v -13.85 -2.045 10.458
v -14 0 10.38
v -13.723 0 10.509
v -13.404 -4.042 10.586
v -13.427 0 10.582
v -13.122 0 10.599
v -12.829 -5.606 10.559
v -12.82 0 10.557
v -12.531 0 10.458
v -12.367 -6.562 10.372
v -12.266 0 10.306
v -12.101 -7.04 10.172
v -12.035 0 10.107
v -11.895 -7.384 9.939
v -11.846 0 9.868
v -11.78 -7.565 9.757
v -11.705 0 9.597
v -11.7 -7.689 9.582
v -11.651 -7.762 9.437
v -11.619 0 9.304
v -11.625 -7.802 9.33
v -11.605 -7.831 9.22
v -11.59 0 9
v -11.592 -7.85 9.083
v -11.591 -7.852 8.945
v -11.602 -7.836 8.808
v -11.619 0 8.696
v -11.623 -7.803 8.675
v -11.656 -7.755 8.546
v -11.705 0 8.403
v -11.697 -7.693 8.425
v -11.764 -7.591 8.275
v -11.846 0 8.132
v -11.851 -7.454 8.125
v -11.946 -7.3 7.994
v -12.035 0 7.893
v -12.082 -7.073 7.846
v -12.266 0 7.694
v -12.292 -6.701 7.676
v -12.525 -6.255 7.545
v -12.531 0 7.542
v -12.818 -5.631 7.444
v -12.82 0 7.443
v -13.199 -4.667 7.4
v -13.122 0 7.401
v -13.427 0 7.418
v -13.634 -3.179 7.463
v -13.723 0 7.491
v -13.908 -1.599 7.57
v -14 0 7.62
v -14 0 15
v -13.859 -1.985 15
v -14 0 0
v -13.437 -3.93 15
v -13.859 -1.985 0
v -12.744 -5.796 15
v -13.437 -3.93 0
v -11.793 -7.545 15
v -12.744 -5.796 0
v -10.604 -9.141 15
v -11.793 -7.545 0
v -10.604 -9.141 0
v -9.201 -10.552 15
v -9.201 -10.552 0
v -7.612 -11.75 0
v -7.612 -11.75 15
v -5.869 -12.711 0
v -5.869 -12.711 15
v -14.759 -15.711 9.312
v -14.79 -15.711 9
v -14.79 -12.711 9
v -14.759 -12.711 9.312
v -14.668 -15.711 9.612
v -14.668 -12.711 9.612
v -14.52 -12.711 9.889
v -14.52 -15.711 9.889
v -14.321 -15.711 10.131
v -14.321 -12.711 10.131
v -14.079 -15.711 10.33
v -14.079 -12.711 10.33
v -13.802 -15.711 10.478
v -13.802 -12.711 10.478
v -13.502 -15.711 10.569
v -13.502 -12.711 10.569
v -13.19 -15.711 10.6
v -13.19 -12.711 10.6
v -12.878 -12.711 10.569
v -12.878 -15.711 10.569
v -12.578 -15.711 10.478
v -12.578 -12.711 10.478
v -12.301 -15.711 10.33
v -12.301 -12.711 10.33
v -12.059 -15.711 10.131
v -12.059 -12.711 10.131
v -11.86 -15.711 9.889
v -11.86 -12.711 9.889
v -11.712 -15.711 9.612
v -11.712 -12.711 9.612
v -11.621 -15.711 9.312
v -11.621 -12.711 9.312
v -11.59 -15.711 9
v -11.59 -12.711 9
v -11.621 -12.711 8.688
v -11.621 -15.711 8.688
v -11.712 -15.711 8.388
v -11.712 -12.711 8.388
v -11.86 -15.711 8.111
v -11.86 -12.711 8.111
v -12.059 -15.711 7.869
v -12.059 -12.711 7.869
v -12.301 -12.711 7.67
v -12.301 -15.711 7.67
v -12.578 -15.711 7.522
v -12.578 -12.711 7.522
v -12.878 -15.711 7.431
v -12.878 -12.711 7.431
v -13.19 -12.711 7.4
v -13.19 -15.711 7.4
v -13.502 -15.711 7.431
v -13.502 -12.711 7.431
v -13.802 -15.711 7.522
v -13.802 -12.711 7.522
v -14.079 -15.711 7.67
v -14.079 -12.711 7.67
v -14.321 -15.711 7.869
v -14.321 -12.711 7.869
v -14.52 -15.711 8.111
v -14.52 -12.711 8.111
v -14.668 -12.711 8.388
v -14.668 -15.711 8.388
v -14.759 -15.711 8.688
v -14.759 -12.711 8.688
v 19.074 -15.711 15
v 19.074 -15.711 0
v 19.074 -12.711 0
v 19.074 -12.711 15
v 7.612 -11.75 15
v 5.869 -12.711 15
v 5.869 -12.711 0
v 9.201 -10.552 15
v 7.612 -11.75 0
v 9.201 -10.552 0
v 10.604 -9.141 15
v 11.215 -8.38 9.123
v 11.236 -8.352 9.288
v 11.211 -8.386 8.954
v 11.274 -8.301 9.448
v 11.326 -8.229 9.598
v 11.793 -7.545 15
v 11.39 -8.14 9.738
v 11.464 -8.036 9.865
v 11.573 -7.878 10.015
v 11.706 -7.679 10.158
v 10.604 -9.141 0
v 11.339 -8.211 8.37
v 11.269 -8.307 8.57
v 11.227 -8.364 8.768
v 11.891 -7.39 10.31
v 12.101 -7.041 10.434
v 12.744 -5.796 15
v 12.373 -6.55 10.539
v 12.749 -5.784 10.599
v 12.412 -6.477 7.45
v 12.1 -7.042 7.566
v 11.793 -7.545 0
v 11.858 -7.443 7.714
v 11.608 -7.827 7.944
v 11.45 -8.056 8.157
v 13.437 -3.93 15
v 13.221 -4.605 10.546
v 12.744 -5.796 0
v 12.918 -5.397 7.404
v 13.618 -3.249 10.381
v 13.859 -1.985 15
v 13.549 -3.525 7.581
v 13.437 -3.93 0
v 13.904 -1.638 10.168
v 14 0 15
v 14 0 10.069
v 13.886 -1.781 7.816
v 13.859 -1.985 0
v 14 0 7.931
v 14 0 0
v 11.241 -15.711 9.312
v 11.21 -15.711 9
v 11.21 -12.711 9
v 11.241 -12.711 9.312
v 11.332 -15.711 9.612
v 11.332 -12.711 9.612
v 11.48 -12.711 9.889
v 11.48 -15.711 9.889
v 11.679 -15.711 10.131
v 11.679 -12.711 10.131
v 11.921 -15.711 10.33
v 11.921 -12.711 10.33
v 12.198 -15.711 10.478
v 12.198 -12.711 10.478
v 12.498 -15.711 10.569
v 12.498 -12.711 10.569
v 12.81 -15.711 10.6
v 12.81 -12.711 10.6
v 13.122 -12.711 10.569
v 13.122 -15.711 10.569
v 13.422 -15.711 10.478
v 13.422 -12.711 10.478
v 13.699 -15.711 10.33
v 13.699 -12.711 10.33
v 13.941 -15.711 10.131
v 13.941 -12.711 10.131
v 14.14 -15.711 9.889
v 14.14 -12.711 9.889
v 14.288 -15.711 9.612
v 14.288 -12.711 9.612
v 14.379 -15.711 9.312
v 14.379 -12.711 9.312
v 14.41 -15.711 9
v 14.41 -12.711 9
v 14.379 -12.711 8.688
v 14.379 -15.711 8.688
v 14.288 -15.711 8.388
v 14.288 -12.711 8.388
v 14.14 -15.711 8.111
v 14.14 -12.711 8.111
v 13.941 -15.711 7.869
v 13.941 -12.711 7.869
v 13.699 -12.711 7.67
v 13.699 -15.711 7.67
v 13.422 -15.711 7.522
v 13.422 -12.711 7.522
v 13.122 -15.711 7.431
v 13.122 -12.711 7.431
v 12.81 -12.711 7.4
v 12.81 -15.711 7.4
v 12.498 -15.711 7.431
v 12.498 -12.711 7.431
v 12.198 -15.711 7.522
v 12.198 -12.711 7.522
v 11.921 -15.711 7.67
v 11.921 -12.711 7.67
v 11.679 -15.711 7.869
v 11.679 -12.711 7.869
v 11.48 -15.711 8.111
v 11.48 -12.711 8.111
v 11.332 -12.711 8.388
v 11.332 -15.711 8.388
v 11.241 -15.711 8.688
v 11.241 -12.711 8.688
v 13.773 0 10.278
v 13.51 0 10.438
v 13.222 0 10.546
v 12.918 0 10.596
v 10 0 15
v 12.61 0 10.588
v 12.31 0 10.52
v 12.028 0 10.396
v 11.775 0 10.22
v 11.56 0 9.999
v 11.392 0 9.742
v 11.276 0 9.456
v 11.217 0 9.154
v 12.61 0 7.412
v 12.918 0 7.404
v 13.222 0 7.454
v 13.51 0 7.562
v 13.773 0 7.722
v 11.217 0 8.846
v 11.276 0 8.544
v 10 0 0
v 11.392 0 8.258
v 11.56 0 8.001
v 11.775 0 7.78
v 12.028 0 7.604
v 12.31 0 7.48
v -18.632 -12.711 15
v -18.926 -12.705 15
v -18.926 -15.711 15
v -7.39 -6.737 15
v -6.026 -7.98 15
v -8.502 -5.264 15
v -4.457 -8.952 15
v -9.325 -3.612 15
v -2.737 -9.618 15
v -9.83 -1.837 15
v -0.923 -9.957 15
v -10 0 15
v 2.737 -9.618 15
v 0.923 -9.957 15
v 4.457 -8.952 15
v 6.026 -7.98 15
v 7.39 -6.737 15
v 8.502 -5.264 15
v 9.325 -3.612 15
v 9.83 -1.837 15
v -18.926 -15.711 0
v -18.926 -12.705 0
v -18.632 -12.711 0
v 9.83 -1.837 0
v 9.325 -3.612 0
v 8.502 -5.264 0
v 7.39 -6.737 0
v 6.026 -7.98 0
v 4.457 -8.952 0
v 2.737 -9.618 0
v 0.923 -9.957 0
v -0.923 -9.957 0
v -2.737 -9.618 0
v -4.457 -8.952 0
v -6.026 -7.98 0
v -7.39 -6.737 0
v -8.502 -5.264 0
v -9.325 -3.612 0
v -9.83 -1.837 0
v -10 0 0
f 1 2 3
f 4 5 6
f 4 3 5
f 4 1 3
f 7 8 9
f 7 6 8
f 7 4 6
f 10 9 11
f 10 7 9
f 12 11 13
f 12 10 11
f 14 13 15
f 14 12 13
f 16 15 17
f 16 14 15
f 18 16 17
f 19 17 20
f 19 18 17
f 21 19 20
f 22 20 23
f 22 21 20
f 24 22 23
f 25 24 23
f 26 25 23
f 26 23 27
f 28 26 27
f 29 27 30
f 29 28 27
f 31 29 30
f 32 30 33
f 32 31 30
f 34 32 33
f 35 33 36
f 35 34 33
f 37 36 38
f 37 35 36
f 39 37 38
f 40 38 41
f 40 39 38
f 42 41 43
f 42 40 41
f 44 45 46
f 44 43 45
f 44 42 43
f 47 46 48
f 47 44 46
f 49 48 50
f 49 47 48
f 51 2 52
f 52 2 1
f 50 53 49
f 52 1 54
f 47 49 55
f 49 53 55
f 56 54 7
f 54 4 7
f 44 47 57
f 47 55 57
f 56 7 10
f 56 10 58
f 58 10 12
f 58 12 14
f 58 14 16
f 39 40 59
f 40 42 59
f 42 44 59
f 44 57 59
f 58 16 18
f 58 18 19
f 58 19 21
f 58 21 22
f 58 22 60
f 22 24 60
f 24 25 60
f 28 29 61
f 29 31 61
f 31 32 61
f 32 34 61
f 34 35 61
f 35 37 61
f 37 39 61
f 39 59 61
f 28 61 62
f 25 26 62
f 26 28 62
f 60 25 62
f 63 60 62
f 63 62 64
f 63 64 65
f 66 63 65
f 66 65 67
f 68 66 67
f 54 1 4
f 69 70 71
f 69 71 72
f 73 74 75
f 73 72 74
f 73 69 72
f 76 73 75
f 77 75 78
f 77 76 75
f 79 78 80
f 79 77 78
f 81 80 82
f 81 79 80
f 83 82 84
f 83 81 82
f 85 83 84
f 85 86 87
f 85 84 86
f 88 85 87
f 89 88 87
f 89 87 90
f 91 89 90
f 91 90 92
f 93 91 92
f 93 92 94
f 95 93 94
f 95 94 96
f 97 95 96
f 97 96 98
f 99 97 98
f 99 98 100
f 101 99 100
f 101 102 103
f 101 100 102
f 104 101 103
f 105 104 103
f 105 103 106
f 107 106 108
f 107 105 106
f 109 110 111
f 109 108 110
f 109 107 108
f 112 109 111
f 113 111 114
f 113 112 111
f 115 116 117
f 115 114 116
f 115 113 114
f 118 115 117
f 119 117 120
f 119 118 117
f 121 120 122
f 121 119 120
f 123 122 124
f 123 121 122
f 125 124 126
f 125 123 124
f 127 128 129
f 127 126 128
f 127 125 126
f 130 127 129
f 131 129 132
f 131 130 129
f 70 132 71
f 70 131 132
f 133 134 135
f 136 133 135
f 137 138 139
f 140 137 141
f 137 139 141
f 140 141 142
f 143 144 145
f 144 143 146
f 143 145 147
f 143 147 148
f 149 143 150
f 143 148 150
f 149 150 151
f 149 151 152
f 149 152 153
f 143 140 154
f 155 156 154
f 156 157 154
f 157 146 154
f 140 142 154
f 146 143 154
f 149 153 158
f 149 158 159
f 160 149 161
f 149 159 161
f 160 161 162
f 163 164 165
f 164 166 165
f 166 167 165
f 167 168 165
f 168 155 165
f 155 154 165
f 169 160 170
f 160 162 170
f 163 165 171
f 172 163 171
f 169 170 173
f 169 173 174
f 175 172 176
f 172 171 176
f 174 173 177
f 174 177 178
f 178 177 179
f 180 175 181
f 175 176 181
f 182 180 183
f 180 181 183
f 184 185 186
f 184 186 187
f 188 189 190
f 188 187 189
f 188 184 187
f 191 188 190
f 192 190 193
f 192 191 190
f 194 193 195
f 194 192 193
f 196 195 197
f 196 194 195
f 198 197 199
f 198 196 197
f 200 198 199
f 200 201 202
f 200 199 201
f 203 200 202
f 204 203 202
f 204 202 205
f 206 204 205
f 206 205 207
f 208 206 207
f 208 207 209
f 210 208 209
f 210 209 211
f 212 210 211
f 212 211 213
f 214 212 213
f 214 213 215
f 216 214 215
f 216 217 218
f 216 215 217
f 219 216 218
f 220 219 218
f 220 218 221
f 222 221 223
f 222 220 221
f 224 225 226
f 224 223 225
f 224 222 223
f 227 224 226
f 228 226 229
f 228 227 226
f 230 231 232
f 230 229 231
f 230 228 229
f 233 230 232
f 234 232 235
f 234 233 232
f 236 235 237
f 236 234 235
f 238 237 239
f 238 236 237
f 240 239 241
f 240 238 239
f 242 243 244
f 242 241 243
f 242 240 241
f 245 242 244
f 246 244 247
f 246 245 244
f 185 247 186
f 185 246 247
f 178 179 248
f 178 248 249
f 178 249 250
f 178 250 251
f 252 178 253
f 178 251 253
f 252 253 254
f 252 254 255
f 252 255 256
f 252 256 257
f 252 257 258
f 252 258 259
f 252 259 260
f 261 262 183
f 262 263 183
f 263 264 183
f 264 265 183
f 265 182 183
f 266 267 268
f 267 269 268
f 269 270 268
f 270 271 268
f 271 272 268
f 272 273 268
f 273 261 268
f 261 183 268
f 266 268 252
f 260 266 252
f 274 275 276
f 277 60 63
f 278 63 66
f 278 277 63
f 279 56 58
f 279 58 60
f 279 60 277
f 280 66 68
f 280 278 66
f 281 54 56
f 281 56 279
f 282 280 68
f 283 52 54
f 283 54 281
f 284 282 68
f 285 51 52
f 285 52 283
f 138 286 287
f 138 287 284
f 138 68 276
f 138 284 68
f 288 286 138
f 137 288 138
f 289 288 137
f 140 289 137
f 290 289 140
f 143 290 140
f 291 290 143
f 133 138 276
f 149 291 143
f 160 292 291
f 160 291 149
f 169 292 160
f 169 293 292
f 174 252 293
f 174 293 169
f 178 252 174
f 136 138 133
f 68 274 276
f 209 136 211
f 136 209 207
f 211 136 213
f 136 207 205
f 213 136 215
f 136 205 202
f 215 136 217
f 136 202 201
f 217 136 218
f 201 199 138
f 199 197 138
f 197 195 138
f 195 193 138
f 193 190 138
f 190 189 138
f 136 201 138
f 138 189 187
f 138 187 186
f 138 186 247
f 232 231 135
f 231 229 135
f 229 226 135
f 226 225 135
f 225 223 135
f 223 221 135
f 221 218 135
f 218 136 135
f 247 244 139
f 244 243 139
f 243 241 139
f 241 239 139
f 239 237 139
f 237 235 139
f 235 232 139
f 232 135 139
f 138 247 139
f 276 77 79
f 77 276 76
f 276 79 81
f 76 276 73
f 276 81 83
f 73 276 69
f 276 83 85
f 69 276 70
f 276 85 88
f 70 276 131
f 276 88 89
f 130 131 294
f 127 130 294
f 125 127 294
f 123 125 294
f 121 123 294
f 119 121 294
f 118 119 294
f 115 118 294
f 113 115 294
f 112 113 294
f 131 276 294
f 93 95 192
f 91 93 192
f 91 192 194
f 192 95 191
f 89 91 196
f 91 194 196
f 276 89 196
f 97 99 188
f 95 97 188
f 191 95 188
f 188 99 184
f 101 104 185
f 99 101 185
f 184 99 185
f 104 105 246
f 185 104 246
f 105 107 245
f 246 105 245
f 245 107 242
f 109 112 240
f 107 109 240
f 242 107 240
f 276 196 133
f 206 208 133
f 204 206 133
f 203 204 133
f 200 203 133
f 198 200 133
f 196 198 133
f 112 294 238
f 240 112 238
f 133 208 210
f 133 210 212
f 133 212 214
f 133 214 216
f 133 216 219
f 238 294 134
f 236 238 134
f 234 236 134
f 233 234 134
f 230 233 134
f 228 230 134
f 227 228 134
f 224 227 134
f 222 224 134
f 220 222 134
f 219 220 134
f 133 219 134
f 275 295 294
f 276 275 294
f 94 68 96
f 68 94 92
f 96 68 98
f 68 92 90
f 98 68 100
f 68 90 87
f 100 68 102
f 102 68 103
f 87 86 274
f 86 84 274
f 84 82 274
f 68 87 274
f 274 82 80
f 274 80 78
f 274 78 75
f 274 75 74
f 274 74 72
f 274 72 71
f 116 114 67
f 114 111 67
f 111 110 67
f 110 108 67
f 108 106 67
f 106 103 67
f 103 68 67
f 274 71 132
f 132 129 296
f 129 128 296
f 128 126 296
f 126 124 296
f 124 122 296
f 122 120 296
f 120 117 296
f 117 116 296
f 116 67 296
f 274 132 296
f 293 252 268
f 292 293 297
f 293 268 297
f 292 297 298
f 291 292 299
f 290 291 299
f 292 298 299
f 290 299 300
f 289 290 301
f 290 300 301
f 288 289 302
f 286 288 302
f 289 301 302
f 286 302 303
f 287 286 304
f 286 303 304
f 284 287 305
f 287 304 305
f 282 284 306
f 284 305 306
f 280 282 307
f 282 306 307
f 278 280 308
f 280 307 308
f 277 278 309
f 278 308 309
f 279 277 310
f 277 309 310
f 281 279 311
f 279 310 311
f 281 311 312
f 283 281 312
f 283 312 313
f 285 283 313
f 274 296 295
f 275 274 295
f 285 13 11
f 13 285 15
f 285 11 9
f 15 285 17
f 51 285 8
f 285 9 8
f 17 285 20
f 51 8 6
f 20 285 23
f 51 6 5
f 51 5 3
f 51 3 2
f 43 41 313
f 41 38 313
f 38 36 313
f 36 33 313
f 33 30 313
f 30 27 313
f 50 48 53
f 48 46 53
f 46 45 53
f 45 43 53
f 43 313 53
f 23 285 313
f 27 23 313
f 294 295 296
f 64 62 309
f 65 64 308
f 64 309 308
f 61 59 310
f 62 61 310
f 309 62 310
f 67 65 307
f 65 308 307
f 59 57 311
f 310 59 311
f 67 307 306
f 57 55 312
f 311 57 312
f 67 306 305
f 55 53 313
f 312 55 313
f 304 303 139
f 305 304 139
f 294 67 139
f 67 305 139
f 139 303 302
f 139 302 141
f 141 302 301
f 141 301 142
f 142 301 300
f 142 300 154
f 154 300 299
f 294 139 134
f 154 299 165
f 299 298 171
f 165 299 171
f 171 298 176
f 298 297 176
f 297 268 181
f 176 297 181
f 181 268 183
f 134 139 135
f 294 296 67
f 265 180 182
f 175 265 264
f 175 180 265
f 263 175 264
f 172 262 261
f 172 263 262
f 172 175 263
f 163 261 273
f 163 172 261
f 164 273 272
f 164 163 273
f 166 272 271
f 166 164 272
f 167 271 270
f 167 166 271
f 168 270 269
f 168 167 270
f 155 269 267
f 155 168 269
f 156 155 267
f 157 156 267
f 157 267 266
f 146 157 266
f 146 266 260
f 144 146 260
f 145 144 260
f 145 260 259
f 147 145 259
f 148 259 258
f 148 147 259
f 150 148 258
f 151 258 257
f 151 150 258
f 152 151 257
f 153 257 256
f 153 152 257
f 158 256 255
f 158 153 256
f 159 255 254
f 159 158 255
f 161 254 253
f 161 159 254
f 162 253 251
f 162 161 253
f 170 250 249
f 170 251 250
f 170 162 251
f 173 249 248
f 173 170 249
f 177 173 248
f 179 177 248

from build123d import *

# Parameters (mm, degrees)
EXTRUDE_1_DEPTH          = 15
CUT_EXTRUDE_1_DEPTH      = 28.393120676
CUT_EXTRUDE_1_DEPTH_BACK = 28.393120676
SKETCH_2_R               = 1.6


with BuildPart() as part:
    # 草图1 → 凸台-拉伸1 (new body)
    with BuildSketch(Plane.XY):
        with BuildLine():
            Line((-18.631868928, -12.71063098), (-18.925857281, -12.705463728))
            Line((-18.925857281, -12.705463728), (-18.925857281, -15.71063098))
            Line((-18.925857281, -15.71063098), (19.074142719, -15.71063098))
            Line((19.074142719, -15.71063098), (19.074142719, -12.71063098))
            Line((19.074142719, -12.71063098), (5.86854838, -12.71063098))
            ThreePointArc((5.86854838, -12.71063098), (11.79321155, -7.544545138), (14, 0))
            Line((14, 0), (10, 0))
            ThreePointArc((10, 0), (0, -10), (-10, 0))
            Line((-10, 0), (-14, 0))
            ThreePointArc((-14, 0), (-11.79321155, -7.544545138), (-5.86854838, -12.71063098))
            Line((-5.86854838, -12.71063098), (-18.631868928, -12.71063098))
        make_face()
    extrude(amount=EXTRUDE_1_DEPTH)

    # 草图2 → 切除-拉伸1 (cut, two sides: drawn at the far end of the back side and taken through both)
    with BuildSketch(Plane(origin=(0, -12.71063098, 0), x_dir=(1, 0, 0), z_dir=(0, 1, 0)).offset(-CUT_EXTRUDE_1_DEPTH_BACK)):
        with Locations(Location((-13.190081146, -9, 0), (0, 0, 180))):
            Circle(SKETCH_2_R)
        with Locations(Location((12.809918854, -9, 0), (0, 0, 180))):
            Circle(SKETCH_2_R)
    extrude(amount=CUT_EXTRUDE_1_DEPTH + CUT_EXTRUDE_1_DEPTH_BACK, mode=Mode.SUBTRACT)


solid = part.part
